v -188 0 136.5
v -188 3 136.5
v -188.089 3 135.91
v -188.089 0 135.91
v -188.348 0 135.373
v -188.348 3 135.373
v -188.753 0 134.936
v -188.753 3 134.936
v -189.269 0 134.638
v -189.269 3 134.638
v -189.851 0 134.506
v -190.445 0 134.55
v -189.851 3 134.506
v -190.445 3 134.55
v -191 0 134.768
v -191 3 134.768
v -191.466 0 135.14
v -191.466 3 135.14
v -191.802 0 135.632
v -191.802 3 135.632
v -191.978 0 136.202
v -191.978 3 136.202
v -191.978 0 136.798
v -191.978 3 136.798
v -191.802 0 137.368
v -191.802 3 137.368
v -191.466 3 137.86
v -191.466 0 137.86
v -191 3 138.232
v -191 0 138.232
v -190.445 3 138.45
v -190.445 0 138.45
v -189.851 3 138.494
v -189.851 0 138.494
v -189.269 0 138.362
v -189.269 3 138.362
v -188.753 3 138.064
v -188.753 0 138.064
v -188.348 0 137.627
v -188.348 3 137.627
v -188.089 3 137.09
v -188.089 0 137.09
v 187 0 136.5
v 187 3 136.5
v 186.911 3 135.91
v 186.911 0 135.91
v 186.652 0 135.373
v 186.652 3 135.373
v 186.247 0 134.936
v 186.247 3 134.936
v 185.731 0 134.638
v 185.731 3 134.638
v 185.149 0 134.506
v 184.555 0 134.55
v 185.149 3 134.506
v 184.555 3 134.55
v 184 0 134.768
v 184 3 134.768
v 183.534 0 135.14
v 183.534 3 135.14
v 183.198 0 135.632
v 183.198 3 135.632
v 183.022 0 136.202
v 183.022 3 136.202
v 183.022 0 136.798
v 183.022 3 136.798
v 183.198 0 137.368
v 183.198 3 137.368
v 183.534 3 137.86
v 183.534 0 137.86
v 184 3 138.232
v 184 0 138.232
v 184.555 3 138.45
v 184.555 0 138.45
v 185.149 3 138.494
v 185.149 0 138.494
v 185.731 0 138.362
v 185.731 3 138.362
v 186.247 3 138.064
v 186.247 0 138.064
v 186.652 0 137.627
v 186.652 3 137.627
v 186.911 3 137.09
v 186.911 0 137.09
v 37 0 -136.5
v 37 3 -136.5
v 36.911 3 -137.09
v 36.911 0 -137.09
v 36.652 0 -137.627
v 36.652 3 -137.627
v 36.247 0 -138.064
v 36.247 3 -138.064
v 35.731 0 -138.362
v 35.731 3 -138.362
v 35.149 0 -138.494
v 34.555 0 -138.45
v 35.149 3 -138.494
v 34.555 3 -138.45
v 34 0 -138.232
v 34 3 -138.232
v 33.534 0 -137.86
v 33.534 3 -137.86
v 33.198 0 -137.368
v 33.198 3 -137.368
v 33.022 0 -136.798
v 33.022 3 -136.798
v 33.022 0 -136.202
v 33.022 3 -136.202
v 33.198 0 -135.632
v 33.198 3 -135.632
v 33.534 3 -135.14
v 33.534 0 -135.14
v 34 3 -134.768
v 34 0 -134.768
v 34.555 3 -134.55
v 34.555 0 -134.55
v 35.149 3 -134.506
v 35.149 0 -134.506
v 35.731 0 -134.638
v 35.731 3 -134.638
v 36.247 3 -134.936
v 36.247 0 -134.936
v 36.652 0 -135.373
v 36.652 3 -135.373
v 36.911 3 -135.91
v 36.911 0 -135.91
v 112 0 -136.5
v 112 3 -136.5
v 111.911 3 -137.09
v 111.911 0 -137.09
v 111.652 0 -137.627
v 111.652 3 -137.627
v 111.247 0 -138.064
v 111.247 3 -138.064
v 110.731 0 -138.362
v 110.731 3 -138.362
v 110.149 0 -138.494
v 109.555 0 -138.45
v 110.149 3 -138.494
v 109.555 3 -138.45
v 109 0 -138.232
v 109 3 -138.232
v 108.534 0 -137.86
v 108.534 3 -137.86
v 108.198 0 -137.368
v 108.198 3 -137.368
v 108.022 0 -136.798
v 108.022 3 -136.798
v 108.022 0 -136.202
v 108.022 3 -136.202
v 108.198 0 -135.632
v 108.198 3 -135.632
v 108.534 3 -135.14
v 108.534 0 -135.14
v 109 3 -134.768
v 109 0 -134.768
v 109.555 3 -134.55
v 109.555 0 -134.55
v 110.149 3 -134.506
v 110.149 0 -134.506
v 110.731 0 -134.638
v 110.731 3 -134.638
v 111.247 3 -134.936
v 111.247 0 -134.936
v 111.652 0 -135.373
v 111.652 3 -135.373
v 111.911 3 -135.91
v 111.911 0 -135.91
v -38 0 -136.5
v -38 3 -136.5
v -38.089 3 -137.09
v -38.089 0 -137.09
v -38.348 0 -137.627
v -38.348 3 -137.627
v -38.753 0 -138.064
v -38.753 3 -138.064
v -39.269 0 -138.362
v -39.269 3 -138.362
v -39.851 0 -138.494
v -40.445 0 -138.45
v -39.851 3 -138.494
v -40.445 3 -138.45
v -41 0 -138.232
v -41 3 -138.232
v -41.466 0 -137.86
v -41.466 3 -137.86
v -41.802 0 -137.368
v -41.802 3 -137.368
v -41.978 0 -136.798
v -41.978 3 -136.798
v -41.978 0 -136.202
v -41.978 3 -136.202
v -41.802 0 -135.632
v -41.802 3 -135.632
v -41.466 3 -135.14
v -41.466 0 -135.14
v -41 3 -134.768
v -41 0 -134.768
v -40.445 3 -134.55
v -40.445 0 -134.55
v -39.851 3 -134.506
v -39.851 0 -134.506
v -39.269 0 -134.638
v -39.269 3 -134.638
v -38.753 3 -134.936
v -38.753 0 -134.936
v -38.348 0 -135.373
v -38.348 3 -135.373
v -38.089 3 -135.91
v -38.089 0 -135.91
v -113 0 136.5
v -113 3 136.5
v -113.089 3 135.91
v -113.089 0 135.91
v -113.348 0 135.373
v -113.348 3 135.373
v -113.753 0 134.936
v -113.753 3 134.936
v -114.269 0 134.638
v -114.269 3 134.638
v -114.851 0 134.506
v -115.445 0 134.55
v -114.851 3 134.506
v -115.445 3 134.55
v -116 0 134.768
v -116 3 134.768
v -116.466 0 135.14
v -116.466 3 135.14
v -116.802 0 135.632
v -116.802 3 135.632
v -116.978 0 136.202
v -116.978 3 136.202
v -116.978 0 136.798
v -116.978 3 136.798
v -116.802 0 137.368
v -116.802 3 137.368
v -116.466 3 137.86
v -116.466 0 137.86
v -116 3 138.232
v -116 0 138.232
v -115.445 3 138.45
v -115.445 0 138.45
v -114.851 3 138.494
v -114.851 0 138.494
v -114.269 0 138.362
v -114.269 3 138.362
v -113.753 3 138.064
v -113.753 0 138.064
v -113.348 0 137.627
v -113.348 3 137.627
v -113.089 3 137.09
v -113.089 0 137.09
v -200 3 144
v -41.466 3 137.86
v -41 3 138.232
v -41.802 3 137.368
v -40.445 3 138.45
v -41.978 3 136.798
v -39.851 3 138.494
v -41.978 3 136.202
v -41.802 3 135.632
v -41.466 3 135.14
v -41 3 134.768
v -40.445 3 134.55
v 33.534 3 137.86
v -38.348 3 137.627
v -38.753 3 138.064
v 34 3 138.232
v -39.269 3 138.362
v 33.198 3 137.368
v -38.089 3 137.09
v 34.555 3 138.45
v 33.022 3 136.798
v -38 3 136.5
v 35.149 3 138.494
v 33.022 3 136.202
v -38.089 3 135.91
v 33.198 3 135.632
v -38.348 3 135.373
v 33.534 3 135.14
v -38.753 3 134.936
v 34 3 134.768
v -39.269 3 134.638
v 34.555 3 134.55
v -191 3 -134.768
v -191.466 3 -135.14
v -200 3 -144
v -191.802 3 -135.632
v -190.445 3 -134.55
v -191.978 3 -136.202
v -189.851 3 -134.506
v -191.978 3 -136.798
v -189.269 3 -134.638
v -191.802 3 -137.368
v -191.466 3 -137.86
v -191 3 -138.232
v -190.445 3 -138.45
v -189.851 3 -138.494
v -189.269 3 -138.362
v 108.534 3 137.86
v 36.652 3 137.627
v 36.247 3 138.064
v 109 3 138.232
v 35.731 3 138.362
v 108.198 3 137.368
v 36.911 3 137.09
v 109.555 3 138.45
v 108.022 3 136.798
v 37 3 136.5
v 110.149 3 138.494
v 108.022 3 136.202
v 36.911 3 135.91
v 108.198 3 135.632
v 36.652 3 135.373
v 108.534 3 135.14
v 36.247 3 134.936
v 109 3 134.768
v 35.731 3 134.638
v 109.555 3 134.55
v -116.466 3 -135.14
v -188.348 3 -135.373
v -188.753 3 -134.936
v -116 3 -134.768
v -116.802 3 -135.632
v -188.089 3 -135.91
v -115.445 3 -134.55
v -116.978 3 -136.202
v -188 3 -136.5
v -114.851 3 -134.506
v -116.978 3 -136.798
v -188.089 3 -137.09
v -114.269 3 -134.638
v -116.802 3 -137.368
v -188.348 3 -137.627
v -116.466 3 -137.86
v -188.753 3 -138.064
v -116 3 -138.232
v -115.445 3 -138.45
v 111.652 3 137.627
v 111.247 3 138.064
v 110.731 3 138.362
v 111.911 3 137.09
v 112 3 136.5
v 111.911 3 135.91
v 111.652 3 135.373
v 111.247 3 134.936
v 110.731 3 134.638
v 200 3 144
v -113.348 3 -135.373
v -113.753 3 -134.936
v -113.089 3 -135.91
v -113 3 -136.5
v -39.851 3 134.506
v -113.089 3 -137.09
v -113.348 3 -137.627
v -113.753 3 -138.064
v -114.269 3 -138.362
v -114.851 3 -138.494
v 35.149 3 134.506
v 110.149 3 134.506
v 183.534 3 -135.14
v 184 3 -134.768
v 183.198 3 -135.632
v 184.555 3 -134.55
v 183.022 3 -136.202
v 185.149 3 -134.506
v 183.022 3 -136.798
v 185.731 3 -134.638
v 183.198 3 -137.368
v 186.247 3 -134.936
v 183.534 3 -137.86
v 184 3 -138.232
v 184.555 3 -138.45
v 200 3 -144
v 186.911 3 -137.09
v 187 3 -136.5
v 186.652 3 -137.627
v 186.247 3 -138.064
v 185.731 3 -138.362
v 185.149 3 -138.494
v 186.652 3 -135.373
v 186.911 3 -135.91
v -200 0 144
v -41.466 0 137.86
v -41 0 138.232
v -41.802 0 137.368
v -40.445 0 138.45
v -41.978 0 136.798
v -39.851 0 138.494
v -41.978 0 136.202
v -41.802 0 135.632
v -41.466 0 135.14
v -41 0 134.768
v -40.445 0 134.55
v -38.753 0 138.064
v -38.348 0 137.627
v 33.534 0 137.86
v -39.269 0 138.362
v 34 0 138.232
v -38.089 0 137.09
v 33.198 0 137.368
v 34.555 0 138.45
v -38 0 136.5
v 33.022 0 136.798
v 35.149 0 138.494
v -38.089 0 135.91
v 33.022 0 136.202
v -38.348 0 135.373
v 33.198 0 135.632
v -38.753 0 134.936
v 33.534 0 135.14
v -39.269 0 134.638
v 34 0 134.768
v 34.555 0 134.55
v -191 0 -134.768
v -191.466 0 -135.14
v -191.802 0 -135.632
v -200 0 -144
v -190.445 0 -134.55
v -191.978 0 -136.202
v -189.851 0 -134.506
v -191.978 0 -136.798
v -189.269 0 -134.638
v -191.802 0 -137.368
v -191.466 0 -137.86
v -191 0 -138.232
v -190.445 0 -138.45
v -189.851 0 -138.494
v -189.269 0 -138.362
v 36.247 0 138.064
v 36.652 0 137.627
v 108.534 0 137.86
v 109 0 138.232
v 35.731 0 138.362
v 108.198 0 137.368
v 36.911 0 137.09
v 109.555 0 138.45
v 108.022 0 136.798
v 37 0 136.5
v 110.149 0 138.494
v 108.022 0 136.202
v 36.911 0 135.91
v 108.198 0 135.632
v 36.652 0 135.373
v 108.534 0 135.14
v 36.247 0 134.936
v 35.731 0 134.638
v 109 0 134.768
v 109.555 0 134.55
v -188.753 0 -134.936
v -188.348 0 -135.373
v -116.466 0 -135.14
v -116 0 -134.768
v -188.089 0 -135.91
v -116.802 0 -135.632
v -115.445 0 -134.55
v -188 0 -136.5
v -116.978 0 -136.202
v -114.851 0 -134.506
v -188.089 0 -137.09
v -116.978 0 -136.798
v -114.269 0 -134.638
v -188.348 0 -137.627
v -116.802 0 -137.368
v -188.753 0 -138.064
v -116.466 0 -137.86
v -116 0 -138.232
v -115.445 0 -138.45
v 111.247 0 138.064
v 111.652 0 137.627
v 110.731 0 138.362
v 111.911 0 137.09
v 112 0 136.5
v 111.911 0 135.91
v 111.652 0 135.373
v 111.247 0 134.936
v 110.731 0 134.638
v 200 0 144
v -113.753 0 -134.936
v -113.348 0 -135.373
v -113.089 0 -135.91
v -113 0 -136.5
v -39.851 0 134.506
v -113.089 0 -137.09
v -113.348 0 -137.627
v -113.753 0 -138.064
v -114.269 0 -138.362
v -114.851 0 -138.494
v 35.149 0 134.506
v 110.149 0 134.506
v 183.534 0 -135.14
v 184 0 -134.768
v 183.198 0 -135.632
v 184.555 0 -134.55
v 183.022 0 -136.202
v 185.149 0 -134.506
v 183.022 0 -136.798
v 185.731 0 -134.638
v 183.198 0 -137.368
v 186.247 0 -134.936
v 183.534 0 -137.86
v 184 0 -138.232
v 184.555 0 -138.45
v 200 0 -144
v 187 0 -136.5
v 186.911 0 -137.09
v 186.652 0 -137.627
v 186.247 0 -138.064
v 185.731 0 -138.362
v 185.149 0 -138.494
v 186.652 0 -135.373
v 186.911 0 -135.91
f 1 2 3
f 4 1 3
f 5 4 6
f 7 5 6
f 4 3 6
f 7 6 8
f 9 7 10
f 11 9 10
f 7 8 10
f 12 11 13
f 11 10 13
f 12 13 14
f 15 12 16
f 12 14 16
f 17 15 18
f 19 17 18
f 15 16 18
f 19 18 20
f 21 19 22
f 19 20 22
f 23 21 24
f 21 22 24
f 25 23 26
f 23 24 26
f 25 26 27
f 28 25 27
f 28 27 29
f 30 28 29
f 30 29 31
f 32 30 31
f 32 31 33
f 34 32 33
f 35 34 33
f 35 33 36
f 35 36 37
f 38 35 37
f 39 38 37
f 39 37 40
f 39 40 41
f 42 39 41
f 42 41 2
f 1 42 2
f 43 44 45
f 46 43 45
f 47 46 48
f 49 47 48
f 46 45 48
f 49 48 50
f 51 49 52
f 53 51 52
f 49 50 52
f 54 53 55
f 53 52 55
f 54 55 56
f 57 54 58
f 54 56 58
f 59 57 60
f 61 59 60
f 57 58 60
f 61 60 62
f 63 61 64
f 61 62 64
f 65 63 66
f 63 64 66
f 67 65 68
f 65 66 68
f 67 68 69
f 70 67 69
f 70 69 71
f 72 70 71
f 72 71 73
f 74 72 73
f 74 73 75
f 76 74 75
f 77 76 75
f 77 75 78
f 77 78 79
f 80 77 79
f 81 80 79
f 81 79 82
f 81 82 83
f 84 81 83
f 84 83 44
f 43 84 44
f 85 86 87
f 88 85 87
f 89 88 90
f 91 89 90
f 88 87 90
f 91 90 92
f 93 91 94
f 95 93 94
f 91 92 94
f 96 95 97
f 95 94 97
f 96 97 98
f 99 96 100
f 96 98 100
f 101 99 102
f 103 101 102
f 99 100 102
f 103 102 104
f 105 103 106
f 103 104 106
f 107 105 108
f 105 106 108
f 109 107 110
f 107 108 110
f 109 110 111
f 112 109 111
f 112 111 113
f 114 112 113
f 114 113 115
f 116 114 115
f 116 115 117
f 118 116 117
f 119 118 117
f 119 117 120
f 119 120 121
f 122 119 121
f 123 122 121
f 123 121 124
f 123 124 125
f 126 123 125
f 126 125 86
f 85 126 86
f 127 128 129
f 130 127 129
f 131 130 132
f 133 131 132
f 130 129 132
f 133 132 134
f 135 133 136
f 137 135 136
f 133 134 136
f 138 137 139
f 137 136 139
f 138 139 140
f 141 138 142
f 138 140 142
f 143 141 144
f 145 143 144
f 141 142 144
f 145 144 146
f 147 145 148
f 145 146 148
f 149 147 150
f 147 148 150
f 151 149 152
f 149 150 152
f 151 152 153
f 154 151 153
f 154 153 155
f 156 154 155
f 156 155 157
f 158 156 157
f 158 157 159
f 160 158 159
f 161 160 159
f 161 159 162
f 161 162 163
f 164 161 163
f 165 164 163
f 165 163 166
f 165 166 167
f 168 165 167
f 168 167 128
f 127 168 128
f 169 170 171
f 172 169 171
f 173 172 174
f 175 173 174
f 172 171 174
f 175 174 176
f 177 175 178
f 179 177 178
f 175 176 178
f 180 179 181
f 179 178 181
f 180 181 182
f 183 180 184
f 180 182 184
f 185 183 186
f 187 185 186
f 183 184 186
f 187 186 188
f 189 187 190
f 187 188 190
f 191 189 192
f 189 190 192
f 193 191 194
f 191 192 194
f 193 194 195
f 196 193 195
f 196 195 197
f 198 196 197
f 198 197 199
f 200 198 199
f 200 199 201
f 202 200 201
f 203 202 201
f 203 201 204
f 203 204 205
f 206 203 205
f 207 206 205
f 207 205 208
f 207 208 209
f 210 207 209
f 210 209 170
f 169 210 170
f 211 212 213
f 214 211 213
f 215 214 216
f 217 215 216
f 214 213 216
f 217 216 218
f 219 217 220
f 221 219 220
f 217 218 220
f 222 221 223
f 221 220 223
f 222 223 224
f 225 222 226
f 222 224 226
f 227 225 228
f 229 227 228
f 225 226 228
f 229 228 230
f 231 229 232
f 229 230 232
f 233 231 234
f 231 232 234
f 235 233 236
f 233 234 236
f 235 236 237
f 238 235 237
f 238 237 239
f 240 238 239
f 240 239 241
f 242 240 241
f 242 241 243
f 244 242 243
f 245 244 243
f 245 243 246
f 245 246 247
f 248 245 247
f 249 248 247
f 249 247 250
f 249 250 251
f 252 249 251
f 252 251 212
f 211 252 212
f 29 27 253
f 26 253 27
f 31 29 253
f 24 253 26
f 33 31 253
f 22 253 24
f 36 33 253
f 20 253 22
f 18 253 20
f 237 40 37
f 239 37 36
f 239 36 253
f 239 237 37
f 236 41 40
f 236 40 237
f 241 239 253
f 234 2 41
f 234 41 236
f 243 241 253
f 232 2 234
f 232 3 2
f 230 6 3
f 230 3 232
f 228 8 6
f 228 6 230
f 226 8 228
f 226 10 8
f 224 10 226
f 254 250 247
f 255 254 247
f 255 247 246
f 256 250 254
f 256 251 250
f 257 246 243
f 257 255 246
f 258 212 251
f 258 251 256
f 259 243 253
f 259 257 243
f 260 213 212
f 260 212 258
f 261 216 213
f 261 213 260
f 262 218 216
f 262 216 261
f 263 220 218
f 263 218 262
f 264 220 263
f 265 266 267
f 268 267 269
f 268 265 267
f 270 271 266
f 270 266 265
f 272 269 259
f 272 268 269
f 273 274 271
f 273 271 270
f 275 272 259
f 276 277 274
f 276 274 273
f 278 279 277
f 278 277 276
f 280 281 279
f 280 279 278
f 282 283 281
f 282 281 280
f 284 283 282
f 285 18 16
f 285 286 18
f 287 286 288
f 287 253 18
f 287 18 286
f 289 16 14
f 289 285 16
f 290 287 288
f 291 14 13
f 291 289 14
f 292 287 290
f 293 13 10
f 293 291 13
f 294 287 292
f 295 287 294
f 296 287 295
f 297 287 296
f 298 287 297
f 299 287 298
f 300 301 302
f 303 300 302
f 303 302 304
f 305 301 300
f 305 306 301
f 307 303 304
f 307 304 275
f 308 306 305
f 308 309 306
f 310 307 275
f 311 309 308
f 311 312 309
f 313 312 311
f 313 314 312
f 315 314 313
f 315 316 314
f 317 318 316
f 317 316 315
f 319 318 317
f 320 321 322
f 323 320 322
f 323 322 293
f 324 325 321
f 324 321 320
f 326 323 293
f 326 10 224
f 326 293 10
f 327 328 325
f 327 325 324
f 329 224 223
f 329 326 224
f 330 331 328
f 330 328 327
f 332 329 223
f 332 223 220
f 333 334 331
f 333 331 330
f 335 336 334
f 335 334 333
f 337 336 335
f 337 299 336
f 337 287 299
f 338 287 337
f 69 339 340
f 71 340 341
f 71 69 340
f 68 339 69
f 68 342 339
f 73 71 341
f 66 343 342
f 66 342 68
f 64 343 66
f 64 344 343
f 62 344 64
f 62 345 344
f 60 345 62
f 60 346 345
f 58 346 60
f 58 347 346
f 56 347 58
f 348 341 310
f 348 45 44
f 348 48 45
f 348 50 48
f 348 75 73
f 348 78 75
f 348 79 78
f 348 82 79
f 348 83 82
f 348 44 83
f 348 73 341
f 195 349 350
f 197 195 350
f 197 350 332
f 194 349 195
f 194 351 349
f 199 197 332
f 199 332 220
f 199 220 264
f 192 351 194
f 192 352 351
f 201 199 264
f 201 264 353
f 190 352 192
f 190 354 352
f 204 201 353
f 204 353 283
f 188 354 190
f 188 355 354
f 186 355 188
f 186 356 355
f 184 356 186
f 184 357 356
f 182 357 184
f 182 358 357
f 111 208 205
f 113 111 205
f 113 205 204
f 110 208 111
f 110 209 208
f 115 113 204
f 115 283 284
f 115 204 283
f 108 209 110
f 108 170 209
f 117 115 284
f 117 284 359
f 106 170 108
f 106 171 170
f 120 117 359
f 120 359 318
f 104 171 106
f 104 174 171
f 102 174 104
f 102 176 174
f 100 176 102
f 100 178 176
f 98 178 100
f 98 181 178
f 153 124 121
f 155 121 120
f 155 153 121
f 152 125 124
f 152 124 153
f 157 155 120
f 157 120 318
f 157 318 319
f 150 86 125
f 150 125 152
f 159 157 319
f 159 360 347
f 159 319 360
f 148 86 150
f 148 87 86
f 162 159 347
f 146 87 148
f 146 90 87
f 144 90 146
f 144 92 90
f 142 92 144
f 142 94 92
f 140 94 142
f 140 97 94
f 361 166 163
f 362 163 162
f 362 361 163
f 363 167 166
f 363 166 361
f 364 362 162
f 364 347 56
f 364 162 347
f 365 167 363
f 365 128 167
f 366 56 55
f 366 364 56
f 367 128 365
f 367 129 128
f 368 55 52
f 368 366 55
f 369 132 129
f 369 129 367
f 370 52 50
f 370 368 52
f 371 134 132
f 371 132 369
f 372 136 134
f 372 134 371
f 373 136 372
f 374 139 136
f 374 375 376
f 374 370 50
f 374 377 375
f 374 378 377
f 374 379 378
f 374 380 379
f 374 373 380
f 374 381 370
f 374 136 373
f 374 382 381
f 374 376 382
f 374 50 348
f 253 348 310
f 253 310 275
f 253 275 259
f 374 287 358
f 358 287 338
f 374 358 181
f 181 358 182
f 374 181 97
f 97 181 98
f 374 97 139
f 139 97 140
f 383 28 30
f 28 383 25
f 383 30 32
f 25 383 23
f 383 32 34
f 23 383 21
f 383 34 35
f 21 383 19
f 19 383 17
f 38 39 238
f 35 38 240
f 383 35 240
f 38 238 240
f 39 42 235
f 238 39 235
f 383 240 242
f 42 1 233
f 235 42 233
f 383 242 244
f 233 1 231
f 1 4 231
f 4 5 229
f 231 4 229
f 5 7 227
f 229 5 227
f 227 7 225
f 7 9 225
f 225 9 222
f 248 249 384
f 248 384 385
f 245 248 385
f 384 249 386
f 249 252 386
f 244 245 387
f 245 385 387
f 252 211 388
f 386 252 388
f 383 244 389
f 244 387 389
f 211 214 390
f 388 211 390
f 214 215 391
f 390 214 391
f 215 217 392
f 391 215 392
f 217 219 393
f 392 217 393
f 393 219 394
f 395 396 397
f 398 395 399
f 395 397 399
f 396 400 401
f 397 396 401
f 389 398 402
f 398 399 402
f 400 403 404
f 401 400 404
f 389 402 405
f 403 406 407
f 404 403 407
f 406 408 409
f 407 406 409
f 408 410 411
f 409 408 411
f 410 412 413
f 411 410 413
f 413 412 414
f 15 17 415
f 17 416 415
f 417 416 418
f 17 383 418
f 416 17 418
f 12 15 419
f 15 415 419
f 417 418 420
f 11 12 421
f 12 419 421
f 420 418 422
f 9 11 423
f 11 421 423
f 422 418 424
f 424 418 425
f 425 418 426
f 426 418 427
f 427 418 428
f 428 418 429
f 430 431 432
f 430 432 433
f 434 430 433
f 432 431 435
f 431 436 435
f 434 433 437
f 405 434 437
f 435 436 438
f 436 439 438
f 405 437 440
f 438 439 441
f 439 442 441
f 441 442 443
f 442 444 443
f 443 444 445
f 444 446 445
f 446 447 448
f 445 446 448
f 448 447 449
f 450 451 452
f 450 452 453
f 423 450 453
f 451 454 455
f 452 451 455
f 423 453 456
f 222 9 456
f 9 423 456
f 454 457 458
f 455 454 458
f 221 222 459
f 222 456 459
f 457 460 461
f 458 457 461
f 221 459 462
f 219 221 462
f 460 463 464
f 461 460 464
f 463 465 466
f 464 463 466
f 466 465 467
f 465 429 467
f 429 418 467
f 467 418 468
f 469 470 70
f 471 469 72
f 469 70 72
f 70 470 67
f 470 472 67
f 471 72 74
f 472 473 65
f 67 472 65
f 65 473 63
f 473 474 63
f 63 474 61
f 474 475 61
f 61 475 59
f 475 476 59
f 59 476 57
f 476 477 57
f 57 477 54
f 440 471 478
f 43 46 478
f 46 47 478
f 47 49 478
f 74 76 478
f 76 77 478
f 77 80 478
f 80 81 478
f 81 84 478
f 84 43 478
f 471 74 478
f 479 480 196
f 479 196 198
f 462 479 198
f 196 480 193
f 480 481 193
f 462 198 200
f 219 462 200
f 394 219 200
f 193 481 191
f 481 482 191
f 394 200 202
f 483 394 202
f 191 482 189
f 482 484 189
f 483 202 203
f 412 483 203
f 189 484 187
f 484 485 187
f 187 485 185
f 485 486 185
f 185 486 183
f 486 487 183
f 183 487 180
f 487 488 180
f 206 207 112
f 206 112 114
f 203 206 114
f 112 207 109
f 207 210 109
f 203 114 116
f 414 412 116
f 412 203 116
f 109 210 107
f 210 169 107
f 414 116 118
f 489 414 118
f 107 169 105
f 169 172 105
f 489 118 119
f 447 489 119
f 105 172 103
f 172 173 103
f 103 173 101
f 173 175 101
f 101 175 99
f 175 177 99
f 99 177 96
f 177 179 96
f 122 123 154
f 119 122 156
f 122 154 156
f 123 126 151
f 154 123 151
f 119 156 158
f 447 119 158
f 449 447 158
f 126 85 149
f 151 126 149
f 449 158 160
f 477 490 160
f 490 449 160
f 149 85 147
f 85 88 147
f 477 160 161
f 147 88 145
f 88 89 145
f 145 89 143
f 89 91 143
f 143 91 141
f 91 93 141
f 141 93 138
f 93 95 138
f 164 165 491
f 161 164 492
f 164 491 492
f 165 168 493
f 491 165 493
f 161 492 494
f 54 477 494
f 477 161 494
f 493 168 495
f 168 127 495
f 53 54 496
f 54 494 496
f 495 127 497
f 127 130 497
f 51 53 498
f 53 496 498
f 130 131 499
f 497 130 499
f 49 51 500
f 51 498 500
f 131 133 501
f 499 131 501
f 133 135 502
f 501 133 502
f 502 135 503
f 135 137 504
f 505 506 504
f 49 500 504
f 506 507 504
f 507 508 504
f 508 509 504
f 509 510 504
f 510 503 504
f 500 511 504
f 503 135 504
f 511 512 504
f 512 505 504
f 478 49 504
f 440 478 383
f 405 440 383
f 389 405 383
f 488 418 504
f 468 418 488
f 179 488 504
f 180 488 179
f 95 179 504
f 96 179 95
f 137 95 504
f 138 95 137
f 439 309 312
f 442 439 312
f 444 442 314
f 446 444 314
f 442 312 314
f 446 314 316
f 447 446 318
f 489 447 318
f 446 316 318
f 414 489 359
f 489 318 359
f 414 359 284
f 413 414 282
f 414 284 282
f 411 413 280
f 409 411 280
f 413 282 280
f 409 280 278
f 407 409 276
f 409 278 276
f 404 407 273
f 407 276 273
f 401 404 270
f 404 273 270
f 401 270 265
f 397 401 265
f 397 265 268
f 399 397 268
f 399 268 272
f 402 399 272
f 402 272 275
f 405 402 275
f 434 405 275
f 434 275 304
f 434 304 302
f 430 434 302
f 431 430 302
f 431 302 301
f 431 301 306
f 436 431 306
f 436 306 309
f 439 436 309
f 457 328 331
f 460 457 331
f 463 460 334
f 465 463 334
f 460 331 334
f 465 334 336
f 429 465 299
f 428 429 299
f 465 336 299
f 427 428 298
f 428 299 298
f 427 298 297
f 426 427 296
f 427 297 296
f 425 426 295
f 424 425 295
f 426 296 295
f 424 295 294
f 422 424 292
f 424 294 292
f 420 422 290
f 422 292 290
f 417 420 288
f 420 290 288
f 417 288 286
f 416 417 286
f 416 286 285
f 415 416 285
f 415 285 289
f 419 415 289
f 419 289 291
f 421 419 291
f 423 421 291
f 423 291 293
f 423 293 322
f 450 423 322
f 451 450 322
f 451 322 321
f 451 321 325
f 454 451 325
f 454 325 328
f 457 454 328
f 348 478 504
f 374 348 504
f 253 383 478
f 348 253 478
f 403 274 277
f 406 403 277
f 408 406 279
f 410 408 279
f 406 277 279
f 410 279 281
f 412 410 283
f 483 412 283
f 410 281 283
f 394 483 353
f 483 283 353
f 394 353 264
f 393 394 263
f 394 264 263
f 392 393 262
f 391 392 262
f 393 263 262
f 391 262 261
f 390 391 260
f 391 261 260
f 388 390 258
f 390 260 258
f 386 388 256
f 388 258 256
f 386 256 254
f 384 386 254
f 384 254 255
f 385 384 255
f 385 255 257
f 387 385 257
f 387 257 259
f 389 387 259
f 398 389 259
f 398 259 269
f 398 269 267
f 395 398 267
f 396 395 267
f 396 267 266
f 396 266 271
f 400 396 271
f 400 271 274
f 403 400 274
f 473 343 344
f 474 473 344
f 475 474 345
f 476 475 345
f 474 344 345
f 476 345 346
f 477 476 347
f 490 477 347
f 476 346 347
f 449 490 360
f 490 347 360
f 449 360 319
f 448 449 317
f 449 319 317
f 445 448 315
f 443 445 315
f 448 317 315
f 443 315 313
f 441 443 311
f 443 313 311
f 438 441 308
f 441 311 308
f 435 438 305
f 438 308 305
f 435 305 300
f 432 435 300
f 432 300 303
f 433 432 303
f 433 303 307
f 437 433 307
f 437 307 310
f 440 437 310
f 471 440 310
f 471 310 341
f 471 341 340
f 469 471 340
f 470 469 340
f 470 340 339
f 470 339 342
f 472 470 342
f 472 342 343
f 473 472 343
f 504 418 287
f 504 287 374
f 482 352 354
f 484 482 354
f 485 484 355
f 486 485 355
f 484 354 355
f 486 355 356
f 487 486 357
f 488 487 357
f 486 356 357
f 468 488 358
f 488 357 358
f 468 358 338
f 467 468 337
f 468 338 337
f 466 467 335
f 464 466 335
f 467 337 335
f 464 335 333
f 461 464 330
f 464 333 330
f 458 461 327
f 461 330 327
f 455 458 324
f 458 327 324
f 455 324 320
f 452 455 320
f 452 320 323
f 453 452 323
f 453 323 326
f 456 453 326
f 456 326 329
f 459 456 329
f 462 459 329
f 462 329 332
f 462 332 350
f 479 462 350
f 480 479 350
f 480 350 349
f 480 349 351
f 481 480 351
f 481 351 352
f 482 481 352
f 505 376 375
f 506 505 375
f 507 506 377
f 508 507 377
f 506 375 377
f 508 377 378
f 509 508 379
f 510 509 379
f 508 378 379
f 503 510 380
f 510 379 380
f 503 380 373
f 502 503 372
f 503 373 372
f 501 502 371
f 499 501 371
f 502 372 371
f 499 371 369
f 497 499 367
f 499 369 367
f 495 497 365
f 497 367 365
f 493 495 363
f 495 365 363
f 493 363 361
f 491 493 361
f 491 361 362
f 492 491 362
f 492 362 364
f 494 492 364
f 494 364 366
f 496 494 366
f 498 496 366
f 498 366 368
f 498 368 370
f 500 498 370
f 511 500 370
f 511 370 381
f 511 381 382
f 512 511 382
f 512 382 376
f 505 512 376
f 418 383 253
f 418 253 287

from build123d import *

# Parameters (mm, degrees)
SKETCH1_W           = 400
SKETCH1_H           = 288
BOSS_EXTRUDE1_DEPTH = 3
SKETCH2_R           = 2
CUT_EXTRUDE1_DEPTH  = 10


with BuildPart() as part:
    # Sketch1 → Boss-Extrude1 (new body)
    with BuildSketch(Plane(origin=(0, 0, 0), x_dir=(1, 0, 0), z_dir=(0, 1, 0))):
        Rectangle(SKETCH1_W, SKETCH1_H)
    extrude(amount=BOSS_EXTRUDE1_DEPTH)

    # Sketch2 → Cut-Extrude1 (cut)
    with BuildSketch(Plane(origin=(0, 3, 0), x_dir=(1, 0, 0), z_dir=(0, 1, 0))):
        with Locations((-190, 136.5)):
            Circle(SKETCH2_R)
        with Locations((-115, 136.5)):
            Circle(SKETCH2_R)
        with Locations((-40, 136.5)):
            Circle(SKETCH2_R)
        with Locations((35, 136.5)):
            Circle(SKETCH2_R)
        with Locations((110, 136.5)):
            Circle(SKETCH2_R)
        with Locations((185, 136.5)):
            Circle(SKETCH2_R)
        with Locations((185, -136.5)):
            Circle(SKETCH2_R)
        with Locations((110, -136.5)):
            Circle(SKETCH2_R)
        with Locations((35, -136.5)):
            Circle(SKETCH2_R)
        with Locations((-40, -136.5)):
            Circle(SKETCH2_R)
        with Locations((-115, -136.5)):
            Circle(SKETCH2_R)
        with Locations((-190, -136.5)):
            Circle(SKETCH2_R)
    extrude(amount=-CUT_EXTRUDE1_DEPTH, mode=Mode.SUBTRACT)


solid = part.part
